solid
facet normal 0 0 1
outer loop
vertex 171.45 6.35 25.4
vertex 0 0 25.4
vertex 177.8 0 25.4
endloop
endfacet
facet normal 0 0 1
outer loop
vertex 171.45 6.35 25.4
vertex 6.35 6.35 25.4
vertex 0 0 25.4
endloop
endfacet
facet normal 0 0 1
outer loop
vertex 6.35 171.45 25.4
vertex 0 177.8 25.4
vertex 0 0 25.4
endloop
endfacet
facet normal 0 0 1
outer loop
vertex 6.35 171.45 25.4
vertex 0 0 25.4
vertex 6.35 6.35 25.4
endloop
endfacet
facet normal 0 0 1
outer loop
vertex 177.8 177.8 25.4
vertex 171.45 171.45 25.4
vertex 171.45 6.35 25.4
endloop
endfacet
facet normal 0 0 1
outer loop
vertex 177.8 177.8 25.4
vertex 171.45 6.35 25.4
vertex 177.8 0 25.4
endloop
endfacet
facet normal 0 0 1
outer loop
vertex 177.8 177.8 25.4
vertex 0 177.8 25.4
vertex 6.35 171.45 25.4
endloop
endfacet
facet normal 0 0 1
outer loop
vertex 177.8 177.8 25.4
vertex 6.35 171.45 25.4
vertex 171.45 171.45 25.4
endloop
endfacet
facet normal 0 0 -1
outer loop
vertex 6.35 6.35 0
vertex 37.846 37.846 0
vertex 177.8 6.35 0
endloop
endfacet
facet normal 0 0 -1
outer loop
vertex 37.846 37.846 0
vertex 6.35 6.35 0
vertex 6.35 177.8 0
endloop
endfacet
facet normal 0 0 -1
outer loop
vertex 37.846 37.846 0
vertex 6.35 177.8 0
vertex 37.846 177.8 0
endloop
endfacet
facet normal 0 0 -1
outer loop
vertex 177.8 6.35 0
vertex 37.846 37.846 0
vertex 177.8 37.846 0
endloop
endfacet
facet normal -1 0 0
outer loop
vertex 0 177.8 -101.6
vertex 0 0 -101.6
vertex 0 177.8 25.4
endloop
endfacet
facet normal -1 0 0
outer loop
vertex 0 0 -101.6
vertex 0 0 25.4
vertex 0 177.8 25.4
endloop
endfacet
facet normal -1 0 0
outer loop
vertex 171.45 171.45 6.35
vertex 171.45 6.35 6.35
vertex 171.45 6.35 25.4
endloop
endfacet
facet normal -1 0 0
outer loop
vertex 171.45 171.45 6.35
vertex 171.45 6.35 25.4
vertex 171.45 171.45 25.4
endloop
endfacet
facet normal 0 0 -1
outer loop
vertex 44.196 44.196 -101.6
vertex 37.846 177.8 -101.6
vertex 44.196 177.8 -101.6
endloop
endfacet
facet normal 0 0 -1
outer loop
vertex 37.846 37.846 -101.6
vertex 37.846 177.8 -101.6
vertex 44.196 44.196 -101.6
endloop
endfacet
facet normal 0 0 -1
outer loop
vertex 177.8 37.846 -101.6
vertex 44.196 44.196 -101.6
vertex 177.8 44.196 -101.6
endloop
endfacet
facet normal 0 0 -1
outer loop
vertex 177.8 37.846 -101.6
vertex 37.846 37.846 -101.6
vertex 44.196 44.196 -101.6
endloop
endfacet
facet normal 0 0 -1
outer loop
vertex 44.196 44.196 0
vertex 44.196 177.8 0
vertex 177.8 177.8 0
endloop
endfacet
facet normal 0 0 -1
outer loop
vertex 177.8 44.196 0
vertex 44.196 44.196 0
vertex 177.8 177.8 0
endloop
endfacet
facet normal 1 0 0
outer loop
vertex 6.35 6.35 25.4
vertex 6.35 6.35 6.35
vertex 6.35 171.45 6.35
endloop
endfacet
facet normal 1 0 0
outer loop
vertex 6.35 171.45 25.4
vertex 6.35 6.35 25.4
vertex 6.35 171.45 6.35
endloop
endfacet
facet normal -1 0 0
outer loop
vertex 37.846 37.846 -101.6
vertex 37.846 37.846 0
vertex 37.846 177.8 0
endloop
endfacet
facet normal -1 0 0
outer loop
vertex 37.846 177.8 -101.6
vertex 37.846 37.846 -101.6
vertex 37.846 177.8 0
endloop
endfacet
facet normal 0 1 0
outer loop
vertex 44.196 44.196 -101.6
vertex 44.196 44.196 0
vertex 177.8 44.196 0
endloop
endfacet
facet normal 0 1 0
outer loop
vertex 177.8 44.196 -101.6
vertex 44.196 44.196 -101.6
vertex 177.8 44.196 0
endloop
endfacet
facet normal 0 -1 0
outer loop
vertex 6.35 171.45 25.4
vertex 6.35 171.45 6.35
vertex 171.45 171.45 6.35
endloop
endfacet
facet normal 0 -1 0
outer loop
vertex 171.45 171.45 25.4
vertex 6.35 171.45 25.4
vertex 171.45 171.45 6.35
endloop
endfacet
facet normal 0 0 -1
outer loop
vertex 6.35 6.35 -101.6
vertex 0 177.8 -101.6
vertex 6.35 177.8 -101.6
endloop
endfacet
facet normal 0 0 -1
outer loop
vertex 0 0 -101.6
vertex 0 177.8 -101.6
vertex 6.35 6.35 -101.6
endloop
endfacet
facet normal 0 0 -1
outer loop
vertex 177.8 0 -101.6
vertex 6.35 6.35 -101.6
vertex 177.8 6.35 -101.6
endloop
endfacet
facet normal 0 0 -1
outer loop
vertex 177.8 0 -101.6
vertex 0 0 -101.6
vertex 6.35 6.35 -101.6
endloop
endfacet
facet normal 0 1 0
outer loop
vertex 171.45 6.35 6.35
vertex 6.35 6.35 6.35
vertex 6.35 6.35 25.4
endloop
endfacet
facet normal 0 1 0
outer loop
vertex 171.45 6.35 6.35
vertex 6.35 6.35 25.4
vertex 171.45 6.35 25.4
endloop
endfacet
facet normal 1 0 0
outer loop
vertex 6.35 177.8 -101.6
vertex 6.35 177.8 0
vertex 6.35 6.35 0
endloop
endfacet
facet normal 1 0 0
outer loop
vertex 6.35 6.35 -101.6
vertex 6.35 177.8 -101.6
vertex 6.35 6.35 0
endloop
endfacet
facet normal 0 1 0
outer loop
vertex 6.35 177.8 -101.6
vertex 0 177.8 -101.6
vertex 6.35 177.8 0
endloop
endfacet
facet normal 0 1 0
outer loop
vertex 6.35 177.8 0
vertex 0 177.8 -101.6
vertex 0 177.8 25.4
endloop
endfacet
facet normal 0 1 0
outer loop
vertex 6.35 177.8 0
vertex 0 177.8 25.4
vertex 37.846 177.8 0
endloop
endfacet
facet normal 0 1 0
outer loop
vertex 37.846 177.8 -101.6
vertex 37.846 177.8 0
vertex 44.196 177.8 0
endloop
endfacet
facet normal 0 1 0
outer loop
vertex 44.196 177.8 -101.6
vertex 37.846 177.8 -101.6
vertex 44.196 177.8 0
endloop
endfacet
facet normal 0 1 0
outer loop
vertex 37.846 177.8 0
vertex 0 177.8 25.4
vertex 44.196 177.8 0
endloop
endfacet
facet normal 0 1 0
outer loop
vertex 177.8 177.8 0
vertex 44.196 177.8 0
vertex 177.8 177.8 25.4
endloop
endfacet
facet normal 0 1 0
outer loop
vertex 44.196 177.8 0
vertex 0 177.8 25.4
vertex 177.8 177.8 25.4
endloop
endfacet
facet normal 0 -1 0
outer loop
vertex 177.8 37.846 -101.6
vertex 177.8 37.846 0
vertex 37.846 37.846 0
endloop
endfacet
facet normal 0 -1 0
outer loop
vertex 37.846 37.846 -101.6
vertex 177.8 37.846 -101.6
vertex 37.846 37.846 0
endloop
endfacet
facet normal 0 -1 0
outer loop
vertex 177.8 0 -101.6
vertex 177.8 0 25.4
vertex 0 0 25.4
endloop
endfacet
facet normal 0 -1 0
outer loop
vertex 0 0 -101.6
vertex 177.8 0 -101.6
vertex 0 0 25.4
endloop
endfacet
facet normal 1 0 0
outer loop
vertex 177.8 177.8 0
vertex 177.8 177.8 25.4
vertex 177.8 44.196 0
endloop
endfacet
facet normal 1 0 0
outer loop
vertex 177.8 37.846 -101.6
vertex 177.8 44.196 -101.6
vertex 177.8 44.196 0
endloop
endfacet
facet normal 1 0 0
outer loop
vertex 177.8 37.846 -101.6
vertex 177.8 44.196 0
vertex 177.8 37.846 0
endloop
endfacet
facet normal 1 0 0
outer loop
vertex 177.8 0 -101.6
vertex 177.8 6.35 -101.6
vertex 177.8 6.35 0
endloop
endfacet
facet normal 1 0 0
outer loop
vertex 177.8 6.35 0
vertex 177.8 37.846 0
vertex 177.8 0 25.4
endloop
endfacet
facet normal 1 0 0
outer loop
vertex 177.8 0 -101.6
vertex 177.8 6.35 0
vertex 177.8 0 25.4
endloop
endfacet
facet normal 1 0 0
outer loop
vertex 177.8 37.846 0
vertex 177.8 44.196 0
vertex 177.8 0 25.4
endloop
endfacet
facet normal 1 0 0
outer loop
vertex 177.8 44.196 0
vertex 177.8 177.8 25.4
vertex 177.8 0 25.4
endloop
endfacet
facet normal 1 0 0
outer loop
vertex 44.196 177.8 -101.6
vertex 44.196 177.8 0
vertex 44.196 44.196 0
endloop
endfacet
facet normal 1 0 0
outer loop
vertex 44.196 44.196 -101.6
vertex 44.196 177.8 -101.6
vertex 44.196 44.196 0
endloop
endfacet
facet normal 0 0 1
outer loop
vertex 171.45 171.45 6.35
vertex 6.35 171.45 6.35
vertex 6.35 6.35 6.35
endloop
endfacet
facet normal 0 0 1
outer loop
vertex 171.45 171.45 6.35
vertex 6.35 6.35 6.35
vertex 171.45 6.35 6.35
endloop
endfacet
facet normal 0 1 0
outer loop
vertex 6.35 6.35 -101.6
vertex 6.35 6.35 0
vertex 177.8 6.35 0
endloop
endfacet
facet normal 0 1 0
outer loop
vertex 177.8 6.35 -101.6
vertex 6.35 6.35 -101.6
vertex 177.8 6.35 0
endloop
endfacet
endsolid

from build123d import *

# Parameters (mm, degrees)
F0_W     = 177.8
F0_H     = 177.8
F0_W_2   = 165.1
F0_H_2   = 165.1
F1_DEPTH = 25.4
F2_DEPTH = 6.35
F4_DEPTH = 101.6
F6_DEPTH = 101.6


with BuildPart() as f1:
    # F0 (on Top) → F1 (new body)
    with BuildSketch(Plane.XY):
        with Locations((88.9, 88.9)):
            Rectangle(F0_W, F0_H)
        with Locations((88.9, 88.9)):
            Rectangle(F0_W_2, F0_H_2, mode=Mode.SUBTRACT)
    extrude(amount=F1_DEPTH)

    # F0 (on Top) → F2 (join)
    with BuildSketch(Plane.XY):
        with Locations((88.9, 88.9)):
            Rectangle(F0_W_2, F0_H_2)
    extrude(amount=F2_DEPTH)

    # F3 (on face) → F4 (join)
    with BuildSketch(Plane(origin=(0, 0, 0), x_dir=(1, 0, 0), z_dir=(0, 0, -1))):
        Polygon((177.8, 0), (0, 0), (0, -177.8), (6.35, -177.8), (6.35, -6.35), (177.8, -6.35), align=None)
    extrude(amount=F4_DEPTH)

    # F5 (on face) → F6 (join)
    with BuildSketch(Plane(origin=(0, 0, 0), x_dir=(1, 0, 0), z_dir=(0, 0, -1))):
        Polygon((37.846, -37.846), (37.846, -177.8), (44.196, -177.8), (44.196, -44.196), (177.8, -44.196), (177.8, -37.846), align=None)
    extrude(amount=F6_DEPTH)


solid = f1.part
